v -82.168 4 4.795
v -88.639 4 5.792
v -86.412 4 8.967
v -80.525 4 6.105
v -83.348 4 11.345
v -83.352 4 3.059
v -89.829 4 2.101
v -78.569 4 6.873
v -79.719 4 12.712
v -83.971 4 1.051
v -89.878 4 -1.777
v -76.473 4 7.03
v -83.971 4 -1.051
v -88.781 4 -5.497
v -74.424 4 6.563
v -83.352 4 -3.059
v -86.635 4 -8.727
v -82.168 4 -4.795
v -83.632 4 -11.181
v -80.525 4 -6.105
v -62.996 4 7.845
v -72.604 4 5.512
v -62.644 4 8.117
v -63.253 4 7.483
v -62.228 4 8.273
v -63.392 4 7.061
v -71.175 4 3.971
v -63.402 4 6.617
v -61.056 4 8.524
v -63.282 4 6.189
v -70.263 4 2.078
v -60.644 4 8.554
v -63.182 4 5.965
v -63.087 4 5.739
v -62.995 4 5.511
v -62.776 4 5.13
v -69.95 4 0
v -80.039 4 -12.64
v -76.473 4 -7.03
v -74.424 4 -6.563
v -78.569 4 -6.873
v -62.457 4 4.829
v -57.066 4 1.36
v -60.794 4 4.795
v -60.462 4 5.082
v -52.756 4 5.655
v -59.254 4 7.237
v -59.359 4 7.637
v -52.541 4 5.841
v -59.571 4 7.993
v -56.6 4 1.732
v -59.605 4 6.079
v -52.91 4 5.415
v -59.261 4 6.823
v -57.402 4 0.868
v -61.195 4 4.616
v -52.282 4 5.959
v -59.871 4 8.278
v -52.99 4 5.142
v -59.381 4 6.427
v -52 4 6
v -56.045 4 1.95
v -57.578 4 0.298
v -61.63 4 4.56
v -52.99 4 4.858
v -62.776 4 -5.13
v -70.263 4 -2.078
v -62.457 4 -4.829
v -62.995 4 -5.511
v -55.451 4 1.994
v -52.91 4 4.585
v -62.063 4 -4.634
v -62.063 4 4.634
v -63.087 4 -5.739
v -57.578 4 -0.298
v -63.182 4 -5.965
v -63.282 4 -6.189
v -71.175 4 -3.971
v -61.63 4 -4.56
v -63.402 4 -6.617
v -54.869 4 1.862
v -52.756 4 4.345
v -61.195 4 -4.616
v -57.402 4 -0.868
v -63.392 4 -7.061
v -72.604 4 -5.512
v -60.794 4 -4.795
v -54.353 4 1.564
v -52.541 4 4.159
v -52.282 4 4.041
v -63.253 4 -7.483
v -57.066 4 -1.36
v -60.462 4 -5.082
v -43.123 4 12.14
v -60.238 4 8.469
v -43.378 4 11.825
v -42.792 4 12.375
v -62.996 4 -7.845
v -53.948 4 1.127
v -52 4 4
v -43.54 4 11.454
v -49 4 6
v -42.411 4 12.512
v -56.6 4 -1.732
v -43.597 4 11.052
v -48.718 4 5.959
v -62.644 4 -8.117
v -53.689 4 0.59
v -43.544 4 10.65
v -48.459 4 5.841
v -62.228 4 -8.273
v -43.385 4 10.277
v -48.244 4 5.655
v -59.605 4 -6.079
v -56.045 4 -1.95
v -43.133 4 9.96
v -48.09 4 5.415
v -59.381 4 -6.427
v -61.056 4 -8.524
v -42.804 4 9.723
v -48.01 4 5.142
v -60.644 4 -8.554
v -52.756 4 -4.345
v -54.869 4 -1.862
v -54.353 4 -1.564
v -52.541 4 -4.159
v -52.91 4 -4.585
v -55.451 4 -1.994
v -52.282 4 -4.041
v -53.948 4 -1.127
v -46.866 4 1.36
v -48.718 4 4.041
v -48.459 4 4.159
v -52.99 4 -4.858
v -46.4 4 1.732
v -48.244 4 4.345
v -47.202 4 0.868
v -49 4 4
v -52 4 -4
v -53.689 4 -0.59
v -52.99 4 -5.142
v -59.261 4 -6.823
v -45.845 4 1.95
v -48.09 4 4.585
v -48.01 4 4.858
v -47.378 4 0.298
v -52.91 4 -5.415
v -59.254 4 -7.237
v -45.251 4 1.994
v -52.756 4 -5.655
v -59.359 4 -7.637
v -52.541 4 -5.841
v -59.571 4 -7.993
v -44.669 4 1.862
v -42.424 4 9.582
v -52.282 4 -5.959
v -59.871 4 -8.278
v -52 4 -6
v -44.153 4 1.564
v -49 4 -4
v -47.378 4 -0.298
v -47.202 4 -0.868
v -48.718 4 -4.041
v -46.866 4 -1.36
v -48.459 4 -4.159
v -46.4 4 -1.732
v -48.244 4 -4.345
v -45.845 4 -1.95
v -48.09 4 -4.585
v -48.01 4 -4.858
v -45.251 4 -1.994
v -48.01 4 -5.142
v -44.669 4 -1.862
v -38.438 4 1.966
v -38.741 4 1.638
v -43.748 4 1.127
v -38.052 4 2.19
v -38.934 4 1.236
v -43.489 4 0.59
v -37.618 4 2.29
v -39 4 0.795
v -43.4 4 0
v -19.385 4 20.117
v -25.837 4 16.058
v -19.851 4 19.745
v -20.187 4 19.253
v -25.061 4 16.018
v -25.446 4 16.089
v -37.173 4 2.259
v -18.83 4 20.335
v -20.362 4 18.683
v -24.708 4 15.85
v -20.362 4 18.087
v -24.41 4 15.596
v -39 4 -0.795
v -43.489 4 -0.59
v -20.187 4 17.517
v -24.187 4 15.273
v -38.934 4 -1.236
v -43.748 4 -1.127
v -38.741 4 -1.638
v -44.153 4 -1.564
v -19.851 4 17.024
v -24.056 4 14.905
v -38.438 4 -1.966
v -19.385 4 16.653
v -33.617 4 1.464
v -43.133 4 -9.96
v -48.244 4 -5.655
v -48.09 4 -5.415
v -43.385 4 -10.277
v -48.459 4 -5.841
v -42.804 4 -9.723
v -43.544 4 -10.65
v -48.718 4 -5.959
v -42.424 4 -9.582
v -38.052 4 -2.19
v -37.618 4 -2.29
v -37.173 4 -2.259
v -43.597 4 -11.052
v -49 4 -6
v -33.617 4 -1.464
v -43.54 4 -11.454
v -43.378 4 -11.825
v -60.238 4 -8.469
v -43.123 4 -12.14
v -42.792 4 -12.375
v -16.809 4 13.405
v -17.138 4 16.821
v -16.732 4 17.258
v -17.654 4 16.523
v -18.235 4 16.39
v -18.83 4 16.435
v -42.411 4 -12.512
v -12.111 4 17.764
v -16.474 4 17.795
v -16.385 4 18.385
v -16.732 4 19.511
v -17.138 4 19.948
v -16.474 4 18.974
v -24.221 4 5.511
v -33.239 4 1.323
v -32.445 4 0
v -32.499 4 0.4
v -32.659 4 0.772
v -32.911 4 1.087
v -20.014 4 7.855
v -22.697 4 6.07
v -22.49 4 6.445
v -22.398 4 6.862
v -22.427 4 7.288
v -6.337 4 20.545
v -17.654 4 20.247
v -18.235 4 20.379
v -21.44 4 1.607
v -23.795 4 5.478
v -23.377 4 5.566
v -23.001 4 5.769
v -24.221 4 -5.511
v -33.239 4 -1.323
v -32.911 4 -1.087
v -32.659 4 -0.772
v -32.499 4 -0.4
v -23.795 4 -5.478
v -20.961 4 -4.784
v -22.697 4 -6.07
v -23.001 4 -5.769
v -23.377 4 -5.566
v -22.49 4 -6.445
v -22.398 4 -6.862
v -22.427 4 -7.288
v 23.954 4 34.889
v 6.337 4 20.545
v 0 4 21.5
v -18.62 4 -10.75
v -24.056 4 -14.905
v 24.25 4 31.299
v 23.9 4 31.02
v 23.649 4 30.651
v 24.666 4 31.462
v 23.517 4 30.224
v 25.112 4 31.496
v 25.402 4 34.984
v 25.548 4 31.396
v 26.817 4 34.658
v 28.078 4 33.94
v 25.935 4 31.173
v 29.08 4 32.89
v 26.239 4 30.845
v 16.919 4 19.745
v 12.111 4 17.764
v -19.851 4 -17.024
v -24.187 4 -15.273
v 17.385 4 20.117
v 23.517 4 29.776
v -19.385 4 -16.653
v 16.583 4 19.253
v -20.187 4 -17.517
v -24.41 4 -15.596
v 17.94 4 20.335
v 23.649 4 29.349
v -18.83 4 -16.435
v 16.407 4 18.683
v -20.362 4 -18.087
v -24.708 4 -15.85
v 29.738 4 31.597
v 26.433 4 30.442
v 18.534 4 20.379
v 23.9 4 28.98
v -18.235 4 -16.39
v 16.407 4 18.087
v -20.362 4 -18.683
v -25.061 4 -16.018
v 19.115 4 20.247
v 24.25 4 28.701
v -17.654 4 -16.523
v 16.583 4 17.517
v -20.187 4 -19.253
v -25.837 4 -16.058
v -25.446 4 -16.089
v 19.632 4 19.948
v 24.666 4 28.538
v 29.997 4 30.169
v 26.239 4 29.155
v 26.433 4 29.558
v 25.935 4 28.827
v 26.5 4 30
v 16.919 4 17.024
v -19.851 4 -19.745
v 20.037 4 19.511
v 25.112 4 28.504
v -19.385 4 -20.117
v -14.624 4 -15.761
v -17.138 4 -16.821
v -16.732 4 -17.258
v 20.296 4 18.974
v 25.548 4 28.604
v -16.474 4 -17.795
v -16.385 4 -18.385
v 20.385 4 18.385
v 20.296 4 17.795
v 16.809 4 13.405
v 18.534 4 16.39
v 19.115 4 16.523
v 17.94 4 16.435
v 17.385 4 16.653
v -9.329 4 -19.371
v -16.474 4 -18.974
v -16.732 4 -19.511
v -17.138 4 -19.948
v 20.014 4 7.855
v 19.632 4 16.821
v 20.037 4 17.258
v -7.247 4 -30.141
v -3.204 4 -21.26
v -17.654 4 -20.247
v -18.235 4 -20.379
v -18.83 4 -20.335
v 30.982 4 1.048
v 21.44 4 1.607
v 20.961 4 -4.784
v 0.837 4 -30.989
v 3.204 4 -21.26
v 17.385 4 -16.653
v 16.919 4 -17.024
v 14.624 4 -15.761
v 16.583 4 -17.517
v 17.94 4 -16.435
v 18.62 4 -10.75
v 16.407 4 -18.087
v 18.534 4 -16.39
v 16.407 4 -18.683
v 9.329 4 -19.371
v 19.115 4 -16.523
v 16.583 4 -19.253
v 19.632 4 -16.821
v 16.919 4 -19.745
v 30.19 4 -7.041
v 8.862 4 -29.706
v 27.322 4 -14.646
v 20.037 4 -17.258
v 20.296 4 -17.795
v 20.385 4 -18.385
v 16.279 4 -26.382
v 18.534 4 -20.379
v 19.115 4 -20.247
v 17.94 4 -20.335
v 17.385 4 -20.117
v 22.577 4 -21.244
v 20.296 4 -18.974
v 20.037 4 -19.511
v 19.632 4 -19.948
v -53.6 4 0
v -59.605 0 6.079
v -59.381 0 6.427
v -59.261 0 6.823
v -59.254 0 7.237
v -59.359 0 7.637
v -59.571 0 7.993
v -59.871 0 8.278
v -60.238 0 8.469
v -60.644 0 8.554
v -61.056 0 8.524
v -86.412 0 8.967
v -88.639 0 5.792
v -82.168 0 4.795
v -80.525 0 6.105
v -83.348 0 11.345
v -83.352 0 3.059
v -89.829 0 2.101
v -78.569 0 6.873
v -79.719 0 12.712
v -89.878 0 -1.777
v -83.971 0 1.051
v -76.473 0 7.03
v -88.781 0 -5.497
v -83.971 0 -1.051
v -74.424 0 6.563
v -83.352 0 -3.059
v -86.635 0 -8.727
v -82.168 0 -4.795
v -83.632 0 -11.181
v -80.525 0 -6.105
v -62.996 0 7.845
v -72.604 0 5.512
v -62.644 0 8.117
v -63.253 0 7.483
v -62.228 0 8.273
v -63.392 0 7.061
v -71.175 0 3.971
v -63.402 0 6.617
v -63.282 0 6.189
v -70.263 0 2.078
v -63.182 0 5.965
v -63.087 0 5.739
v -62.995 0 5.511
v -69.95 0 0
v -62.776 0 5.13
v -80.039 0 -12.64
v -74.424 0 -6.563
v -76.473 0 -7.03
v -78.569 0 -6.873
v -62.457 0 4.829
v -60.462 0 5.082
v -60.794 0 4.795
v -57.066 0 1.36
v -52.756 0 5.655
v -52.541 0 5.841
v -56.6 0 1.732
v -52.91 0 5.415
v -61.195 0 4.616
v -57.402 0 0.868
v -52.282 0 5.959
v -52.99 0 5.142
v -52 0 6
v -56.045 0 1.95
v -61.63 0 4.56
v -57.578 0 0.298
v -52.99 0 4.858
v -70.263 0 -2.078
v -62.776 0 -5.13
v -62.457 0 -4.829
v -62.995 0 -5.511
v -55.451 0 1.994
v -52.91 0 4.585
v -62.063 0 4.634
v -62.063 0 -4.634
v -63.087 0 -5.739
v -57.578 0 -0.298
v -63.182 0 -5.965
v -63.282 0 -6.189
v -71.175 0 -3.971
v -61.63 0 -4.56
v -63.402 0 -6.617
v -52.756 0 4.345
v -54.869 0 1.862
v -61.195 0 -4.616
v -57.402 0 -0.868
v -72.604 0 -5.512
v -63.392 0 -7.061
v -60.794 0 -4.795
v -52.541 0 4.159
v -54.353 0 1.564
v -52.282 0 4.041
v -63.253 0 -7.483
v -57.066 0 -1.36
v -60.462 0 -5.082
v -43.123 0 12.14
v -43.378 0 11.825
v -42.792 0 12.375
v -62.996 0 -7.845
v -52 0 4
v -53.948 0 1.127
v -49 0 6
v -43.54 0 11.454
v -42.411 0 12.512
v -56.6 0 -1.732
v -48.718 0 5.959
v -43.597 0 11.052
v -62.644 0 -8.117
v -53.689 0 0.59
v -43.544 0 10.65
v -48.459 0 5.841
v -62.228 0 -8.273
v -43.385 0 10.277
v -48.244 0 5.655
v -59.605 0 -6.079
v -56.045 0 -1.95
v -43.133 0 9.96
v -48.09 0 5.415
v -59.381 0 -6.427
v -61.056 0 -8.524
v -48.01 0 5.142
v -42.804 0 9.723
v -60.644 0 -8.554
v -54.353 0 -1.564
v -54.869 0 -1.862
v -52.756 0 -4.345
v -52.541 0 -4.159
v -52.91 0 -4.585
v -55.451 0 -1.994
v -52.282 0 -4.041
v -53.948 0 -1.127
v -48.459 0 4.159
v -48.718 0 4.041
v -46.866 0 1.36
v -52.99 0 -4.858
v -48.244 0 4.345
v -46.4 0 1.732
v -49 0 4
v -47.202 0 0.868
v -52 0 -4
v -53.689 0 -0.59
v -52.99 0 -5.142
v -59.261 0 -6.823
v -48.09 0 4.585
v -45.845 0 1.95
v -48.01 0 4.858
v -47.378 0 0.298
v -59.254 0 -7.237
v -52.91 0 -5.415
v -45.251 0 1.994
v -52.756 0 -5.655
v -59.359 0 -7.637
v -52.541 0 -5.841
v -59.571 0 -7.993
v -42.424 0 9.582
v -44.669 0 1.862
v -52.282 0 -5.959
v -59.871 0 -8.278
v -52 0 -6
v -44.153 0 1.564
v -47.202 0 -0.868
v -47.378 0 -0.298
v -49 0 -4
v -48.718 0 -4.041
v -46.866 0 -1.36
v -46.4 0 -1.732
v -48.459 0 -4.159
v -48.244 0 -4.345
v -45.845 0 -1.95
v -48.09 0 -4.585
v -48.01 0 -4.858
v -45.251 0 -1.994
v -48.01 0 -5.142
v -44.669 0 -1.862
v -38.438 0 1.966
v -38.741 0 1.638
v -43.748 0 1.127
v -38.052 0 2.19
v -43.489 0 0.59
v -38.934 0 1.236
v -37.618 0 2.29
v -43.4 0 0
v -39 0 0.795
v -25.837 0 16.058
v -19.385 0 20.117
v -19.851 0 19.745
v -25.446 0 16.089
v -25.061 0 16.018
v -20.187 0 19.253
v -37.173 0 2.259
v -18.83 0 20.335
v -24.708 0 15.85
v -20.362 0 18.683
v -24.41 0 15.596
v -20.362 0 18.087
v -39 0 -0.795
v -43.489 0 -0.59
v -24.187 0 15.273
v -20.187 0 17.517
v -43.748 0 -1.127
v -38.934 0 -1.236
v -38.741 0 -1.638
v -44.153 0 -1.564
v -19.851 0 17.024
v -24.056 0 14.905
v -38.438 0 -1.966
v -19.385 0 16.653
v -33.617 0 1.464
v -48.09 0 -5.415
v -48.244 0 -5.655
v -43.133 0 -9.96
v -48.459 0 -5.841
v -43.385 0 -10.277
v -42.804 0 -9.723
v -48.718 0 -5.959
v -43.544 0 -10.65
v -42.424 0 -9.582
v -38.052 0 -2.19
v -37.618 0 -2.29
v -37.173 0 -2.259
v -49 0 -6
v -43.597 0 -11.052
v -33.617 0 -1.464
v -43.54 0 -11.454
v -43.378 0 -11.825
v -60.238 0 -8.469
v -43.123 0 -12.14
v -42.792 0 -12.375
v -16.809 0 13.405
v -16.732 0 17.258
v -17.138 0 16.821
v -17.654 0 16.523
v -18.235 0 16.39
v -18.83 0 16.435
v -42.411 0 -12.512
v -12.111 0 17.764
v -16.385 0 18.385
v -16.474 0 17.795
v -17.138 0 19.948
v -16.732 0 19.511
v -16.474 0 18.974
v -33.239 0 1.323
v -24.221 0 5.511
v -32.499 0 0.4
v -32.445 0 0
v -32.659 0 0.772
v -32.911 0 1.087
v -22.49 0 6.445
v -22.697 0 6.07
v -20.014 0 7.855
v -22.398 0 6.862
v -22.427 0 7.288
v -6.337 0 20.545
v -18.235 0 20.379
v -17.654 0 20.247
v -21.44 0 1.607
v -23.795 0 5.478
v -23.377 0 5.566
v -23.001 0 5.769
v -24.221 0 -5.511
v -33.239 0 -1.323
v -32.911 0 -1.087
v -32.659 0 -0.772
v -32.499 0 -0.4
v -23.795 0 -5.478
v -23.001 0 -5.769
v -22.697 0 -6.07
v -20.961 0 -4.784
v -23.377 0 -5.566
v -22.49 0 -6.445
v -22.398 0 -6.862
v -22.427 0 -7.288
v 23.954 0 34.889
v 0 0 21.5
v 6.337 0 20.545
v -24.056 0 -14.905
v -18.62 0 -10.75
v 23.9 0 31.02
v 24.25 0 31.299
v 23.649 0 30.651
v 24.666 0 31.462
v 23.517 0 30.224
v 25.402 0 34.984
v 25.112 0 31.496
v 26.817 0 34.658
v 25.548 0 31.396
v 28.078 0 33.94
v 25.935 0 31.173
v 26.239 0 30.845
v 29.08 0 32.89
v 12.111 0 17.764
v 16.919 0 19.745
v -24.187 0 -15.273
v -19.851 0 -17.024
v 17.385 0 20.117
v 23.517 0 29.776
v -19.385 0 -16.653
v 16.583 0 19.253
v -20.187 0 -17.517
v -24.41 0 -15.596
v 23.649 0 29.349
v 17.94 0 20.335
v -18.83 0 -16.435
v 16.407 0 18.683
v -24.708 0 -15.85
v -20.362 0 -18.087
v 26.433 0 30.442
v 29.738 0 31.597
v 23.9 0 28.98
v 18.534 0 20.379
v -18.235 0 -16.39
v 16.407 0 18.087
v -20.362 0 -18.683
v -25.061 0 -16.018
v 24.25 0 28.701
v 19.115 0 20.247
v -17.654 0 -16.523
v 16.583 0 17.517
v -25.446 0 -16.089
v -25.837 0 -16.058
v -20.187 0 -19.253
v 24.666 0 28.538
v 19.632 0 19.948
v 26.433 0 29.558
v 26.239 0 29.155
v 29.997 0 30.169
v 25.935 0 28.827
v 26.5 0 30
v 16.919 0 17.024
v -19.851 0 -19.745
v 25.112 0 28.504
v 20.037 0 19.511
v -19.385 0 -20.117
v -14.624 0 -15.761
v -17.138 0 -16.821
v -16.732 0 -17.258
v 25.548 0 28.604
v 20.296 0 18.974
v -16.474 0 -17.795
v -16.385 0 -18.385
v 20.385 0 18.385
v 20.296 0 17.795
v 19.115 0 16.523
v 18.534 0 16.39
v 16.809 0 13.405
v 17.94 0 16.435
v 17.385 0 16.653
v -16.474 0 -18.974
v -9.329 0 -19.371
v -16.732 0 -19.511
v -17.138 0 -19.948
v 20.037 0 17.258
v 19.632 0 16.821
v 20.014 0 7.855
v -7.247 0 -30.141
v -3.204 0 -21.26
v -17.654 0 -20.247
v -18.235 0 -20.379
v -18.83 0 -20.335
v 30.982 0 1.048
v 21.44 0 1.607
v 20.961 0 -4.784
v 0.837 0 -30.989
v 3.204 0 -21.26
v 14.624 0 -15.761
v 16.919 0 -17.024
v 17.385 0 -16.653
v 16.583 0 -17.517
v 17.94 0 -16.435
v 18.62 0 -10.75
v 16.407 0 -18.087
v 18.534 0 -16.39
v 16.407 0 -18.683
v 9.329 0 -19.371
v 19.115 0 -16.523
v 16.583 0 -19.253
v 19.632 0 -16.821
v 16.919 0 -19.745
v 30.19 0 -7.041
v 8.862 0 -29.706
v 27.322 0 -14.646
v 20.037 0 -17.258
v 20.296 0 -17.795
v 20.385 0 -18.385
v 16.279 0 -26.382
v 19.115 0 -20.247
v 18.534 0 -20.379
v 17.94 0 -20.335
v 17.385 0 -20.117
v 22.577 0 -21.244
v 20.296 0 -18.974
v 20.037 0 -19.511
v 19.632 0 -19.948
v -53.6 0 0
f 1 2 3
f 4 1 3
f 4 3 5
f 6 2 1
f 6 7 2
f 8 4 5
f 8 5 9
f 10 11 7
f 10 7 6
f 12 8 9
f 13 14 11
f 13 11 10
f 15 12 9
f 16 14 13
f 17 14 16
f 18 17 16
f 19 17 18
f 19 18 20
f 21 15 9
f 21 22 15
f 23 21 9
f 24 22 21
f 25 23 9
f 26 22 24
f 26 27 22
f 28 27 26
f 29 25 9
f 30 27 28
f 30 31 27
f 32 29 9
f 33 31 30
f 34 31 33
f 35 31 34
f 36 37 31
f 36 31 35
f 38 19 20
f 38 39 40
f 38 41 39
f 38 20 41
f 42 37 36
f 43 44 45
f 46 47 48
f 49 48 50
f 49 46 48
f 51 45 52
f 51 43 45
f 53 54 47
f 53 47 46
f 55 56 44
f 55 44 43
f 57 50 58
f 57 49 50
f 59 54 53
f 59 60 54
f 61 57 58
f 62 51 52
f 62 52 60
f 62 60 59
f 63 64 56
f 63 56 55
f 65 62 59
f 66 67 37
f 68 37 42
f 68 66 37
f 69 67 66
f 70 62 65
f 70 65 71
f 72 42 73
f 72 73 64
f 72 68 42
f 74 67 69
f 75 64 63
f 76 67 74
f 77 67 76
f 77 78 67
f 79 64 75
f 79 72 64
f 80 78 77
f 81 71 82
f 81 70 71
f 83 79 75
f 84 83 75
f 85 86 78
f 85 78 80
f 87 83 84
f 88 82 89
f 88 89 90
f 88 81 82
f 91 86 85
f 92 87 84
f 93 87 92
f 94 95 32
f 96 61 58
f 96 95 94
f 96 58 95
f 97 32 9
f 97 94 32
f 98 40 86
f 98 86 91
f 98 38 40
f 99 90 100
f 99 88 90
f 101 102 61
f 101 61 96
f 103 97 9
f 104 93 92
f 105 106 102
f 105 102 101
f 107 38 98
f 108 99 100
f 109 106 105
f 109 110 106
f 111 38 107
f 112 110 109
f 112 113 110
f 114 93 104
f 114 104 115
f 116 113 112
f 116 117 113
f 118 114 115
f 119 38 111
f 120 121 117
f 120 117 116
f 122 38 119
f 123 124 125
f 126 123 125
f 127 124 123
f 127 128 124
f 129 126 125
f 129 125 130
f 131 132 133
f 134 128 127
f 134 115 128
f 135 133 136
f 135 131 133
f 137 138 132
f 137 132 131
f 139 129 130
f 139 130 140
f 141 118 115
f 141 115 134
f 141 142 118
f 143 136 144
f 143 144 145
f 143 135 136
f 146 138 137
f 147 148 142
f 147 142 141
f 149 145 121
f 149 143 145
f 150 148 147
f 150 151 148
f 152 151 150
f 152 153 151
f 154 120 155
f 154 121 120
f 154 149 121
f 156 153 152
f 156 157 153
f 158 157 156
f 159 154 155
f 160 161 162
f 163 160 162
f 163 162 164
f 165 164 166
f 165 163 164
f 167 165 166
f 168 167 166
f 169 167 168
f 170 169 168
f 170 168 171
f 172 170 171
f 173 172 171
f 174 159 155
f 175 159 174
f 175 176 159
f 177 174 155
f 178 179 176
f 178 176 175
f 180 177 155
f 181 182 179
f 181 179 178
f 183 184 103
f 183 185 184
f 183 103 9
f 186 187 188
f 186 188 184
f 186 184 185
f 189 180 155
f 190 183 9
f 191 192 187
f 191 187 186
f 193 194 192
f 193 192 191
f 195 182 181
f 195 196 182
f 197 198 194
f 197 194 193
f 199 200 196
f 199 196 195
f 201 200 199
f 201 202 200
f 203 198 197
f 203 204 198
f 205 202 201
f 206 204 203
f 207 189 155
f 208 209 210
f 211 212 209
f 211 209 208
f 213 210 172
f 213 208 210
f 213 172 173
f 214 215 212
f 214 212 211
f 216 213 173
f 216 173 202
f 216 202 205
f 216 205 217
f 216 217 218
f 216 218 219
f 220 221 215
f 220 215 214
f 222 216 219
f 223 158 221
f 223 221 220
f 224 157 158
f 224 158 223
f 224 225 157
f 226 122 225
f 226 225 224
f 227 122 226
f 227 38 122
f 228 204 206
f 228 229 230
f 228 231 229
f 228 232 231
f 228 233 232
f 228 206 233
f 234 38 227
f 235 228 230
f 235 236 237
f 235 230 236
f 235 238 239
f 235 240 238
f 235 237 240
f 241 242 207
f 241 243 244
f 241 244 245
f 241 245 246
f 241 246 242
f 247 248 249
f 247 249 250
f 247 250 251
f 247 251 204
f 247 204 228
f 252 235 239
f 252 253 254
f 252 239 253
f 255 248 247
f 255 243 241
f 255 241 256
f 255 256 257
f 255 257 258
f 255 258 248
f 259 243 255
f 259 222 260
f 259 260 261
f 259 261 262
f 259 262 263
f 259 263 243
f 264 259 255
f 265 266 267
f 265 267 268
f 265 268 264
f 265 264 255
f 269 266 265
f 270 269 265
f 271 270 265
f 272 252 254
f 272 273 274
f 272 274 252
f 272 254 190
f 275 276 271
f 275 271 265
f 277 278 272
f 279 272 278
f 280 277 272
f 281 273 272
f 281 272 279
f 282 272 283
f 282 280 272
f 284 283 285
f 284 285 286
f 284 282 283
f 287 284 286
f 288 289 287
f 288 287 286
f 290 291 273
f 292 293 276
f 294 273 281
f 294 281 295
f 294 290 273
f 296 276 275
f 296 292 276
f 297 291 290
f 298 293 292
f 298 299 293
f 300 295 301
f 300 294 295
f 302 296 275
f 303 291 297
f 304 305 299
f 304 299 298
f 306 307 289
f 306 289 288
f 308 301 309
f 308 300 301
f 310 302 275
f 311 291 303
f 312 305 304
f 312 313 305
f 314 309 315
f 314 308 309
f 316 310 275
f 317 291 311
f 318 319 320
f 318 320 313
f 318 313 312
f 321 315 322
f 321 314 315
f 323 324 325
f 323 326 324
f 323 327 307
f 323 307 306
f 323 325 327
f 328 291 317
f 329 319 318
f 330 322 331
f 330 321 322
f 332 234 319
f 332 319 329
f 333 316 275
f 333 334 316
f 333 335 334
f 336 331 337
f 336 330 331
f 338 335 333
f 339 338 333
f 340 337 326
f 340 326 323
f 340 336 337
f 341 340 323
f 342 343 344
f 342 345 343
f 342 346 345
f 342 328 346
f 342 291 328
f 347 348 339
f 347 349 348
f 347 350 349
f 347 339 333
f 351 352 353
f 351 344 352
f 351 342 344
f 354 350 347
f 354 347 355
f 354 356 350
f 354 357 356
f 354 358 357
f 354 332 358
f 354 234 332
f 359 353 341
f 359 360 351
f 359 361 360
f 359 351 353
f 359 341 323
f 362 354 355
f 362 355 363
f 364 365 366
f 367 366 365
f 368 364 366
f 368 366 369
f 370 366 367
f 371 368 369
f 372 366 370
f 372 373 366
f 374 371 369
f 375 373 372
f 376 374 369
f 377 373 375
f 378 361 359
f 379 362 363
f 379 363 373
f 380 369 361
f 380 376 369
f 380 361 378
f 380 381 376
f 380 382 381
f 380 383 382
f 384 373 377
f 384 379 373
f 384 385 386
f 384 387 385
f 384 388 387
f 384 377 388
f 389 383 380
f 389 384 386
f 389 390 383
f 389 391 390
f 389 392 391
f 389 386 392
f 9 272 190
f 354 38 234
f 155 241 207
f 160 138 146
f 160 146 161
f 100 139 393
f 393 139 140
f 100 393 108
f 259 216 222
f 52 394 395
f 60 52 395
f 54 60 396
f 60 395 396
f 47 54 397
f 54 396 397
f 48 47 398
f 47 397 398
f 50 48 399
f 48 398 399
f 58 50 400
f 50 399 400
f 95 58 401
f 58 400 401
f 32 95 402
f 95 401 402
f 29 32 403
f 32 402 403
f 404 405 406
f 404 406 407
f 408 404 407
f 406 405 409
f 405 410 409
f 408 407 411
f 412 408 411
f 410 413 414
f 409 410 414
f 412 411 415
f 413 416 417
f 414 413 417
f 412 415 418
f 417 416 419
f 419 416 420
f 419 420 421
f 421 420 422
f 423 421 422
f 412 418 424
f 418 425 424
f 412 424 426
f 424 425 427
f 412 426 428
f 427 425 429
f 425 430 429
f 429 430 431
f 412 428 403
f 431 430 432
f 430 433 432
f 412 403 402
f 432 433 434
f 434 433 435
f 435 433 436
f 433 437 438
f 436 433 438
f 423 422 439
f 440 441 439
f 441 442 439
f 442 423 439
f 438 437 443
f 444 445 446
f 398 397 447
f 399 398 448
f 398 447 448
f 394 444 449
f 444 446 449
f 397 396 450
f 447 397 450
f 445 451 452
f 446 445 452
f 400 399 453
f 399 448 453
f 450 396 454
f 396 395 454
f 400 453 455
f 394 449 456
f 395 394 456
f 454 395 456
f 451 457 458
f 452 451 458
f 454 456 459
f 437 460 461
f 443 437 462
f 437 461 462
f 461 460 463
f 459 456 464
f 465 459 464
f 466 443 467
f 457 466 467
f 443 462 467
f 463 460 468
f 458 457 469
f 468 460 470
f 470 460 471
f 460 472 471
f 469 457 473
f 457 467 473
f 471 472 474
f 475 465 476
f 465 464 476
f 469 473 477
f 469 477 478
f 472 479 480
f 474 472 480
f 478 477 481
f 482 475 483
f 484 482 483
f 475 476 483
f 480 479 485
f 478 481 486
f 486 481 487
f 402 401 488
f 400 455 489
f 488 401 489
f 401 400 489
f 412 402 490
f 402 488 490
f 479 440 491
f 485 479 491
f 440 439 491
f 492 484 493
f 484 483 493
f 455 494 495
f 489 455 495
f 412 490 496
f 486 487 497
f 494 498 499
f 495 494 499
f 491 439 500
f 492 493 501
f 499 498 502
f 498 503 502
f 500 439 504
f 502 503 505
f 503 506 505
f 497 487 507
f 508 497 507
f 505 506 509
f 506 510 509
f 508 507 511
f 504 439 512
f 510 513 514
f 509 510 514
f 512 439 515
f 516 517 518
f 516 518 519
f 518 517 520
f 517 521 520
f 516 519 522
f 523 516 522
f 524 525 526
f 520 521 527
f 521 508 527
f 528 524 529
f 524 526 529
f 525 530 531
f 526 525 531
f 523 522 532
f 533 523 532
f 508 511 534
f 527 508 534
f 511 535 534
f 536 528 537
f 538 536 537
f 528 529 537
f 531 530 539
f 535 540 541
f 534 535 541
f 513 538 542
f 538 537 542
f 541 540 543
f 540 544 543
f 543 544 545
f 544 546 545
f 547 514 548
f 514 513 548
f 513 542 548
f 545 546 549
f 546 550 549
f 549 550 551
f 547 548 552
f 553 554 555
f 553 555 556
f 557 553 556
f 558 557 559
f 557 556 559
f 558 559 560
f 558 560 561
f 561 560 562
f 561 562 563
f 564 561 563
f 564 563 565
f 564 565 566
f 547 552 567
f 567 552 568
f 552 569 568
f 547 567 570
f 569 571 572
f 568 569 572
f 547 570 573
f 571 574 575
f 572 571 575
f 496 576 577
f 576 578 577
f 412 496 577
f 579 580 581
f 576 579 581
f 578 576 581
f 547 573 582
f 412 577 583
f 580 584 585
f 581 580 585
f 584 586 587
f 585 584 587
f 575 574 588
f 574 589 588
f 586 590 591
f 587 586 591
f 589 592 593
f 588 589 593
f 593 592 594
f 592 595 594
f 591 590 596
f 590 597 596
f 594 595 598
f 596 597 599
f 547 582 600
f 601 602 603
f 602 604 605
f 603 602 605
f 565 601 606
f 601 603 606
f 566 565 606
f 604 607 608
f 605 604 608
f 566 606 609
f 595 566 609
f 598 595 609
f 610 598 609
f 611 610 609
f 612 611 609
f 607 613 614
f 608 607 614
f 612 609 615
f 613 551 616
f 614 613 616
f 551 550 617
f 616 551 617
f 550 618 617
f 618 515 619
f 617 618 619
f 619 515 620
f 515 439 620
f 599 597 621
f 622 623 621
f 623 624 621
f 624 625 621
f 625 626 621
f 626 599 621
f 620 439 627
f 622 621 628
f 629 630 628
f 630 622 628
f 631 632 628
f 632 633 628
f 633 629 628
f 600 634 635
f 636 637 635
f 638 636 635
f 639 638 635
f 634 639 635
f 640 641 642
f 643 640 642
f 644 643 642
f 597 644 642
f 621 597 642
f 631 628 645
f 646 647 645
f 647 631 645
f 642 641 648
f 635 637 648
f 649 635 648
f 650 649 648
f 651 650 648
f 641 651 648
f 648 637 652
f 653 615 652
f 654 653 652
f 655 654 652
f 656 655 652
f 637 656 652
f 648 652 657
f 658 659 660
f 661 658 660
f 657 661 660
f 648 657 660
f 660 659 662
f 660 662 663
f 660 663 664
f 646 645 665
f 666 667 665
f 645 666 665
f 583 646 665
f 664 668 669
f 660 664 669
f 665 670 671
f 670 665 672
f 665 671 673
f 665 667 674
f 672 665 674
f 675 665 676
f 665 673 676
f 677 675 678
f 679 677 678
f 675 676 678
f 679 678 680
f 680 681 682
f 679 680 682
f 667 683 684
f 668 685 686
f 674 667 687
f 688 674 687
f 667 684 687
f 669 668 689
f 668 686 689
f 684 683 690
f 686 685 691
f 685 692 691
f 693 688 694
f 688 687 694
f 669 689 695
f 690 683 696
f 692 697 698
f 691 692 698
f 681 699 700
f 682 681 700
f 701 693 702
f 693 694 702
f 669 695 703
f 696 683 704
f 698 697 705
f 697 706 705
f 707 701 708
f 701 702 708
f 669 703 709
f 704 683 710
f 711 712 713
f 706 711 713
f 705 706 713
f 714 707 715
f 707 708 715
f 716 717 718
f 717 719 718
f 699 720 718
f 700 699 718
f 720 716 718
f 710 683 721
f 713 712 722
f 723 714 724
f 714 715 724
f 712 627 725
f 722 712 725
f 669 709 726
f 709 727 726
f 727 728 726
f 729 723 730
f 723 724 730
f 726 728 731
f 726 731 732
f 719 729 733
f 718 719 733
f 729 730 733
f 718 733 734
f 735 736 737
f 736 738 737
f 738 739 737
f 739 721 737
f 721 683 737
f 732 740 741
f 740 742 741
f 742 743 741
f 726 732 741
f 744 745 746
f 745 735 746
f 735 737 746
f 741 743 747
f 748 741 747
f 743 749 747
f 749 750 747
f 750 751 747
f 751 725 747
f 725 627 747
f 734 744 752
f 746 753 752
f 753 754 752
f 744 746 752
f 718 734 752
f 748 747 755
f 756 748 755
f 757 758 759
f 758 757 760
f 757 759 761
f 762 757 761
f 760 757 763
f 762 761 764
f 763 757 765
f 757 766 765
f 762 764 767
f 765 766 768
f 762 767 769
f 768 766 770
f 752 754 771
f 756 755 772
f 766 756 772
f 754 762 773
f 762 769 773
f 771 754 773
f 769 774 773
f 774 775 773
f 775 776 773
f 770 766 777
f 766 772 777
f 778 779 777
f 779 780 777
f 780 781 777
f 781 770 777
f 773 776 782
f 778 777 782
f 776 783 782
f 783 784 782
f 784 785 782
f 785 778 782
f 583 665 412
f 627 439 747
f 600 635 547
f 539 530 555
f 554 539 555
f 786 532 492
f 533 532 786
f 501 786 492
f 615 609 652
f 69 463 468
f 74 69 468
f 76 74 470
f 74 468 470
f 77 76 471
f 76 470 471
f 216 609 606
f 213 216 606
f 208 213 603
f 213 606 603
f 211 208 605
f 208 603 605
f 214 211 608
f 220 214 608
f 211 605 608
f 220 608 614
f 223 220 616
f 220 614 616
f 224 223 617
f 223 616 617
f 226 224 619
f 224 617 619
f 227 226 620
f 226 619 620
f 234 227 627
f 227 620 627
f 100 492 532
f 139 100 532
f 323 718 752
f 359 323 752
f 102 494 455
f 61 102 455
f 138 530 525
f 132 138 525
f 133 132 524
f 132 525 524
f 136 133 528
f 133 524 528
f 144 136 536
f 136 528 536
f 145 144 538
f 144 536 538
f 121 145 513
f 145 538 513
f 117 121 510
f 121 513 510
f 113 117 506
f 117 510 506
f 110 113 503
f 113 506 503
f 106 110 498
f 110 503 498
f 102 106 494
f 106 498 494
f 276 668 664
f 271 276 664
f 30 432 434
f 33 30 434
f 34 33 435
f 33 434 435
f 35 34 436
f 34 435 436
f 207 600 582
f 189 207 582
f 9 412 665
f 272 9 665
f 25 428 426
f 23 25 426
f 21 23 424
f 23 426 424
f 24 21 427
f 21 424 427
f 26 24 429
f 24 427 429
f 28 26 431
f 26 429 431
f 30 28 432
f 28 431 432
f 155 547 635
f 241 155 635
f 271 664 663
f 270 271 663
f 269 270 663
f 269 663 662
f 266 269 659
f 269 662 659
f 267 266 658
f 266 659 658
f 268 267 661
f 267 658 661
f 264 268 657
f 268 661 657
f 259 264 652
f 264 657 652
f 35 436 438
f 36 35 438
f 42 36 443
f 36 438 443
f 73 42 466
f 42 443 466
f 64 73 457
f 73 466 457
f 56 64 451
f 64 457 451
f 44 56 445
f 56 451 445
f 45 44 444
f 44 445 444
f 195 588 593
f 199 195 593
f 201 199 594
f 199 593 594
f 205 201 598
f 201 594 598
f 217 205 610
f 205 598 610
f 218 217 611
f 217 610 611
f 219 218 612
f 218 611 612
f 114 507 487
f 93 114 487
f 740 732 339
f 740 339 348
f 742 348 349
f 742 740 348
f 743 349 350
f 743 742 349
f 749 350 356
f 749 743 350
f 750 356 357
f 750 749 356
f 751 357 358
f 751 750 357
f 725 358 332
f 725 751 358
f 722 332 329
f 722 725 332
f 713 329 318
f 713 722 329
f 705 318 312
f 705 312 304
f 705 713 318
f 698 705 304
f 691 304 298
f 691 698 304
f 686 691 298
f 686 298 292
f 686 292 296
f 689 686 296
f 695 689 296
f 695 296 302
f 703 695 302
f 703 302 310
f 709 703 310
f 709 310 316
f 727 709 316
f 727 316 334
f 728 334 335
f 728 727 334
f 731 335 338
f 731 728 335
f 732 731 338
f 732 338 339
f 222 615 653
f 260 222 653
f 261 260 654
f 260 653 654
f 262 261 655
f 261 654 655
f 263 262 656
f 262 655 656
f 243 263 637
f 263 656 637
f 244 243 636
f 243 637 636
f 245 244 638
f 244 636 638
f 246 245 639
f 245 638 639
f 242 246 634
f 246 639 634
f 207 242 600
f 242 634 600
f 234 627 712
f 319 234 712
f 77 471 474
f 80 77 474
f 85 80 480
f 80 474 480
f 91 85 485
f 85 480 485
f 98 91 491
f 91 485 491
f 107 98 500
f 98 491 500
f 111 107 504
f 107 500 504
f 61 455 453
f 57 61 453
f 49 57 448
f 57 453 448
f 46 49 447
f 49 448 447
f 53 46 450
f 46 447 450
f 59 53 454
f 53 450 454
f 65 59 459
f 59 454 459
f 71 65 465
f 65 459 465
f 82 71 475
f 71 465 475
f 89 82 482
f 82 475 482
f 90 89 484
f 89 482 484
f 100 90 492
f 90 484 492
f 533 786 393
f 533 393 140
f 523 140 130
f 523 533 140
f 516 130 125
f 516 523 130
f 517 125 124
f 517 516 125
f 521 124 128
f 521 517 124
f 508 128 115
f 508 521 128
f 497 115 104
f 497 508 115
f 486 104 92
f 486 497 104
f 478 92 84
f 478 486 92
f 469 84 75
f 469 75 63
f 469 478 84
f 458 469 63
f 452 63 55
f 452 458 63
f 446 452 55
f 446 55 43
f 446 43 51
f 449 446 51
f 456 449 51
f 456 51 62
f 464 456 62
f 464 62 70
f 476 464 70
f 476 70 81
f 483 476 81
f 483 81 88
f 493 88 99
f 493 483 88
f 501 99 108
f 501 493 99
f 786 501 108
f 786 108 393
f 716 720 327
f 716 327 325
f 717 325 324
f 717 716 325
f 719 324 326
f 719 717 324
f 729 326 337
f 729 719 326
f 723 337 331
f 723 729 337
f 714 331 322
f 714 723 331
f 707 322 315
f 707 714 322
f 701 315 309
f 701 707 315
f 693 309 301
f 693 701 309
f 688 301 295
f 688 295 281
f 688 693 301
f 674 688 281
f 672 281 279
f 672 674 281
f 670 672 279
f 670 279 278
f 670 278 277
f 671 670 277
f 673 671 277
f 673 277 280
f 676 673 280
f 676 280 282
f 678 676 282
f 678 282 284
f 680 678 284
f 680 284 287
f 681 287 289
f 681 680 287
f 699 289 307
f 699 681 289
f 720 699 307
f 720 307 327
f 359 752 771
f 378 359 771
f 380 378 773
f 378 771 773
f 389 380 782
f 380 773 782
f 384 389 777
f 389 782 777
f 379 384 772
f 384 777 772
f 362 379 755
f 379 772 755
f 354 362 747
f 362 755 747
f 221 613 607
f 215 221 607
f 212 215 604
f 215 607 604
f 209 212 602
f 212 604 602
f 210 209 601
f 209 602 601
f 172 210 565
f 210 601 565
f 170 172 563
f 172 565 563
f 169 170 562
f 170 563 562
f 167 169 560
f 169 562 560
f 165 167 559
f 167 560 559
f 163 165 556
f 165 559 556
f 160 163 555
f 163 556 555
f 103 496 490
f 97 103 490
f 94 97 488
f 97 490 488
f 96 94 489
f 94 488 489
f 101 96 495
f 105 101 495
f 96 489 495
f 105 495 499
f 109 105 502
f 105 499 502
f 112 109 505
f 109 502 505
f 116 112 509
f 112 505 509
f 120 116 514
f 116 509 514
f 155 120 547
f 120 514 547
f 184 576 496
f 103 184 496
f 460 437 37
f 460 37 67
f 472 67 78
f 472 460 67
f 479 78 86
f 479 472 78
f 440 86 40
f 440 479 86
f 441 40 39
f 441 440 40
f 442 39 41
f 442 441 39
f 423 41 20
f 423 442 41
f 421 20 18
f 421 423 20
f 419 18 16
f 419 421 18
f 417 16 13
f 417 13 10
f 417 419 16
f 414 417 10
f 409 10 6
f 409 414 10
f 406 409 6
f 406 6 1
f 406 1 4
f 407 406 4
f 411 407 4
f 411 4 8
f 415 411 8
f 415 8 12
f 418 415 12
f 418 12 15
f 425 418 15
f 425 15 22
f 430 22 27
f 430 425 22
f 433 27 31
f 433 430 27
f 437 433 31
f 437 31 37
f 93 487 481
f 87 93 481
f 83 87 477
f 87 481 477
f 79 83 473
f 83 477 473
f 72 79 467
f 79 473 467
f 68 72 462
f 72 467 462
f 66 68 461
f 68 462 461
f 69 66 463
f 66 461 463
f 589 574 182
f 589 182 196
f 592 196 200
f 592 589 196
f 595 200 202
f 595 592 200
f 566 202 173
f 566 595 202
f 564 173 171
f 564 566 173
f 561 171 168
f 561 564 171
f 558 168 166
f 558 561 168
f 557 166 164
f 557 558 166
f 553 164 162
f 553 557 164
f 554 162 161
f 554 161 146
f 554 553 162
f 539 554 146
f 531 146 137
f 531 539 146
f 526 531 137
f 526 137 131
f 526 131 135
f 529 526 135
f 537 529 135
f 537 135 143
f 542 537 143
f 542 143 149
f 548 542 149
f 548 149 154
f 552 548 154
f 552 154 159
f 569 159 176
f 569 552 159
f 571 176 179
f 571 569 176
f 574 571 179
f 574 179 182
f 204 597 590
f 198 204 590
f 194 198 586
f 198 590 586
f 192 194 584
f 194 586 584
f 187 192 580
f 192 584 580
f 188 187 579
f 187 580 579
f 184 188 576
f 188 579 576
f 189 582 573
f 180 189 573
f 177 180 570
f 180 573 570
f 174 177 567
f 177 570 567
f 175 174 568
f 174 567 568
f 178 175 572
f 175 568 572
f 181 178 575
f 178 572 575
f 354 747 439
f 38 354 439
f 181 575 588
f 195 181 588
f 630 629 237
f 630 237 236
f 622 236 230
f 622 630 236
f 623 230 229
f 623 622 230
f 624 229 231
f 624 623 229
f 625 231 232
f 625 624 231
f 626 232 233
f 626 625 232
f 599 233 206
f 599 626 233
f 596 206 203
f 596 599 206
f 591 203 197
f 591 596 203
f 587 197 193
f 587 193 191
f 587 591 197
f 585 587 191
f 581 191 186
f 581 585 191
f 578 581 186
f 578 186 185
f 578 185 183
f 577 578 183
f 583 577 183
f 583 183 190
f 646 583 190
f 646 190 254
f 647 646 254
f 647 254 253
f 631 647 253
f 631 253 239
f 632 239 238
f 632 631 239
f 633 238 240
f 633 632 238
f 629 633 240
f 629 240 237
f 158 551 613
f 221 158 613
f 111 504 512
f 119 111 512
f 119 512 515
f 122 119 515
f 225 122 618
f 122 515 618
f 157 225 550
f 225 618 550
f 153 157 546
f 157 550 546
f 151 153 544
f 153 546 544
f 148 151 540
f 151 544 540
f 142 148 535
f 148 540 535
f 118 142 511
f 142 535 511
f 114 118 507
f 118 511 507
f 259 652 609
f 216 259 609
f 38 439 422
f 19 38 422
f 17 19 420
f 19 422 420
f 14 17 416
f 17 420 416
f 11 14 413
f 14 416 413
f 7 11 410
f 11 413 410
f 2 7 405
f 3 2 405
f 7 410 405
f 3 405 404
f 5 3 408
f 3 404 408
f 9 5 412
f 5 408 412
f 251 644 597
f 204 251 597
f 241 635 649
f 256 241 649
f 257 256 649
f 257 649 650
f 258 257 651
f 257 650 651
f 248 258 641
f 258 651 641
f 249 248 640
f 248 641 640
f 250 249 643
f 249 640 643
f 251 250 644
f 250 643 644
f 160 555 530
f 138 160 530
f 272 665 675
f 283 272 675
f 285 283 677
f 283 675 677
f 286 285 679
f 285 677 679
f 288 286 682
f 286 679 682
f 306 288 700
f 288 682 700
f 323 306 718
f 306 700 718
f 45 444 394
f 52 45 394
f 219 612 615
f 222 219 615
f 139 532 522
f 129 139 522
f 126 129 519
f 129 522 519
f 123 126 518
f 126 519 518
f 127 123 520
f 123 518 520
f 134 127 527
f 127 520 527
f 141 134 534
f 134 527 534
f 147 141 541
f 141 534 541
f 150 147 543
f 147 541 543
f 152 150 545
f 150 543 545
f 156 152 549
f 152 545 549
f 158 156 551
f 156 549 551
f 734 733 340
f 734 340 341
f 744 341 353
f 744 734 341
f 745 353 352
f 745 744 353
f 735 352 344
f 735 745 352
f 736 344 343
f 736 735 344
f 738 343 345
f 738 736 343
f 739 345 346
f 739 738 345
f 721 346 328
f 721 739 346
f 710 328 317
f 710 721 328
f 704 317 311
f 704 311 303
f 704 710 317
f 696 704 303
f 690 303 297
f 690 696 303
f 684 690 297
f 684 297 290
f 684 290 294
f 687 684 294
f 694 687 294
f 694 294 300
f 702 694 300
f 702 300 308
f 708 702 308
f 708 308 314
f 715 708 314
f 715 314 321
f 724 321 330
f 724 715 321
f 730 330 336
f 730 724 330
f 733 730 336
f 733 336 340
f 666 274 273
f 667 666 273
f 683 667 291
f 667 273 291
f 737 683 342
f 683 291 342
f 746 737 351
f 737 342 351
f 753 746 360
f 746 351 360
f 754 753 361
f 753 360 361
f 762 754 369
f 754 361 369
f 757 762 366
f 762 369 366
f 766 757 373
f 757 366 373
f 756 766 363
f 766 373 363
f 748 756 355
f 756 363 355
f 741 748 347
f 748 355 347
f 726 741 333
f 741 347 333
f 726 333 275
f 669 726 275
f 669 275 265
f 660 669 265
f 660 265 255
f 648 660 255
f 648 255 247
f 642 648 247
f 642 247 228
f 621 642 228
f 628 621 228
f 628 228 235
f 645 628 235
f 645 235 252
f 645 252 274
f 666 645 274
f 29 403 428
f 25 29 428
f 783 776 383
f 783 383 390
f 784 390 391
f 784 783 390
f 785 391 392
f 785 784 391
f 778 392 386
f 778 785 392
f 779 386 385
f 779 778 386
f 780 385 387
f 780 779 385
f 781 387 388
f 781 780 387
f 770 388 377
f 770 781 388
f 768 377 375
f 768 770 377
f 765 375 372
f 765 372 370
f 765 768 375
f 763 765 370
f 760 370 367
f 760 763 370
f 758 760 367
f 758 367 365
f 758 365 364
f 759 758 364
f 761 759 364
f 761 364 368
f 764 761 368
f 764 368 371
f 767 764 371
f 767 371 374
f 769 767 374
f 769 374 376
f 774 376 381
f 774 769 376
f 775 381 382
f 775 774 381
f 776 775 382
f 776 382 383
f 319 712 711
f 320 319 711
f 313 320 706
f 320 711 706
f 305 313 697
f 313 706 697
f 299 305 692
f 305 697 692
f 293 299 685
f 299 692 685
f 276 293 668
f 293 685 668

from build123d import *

# Parameters (mm, degrees)
OTHER_194_OUTLINE_R   = 1.5
OTHER_194_OUTLINE_R_2 = 2
OTHER_194_OUTLINE_R_3 = 7.05
OTHER_194_OUTLINE_R_4 = 13
OTHER_194_DEPTH       = 4
SKETCH_2_R            = 21.5
CUT_EXTRUDE_1_DEPTH   = 97.648848933


# Read off the part's stored shape, not the designer's step: the other step
with BuildPart() as part:
    # Other 194 outline → Other 194 (new body)
    with BuildSketch(Plane(origin=(0, 0, 0), x_dir=(1, 0, 0), z_dir=(0, 1, 0))):
        with BuildLine():
            ThreePointArc((-80.038961039, 12.639806795), (-89.998966964, -0.163883698), (-79.719334557, -12.712404162))
            Line((-79.719334557, -12.712404162), (23.954102093, -34.889386216))
            ThreePointArc((23.954102093, -34.889386216), (28.077901504, -33.940370837), (29.997141433, -30.169048806))
            Line((29.997141433, -30.169048806), (30.982276884, -1.048102596))
            ThreePointArc((30.982276884, -1.048102596), (19.596811299, 24.020095481), (-7.246753247, 30.141077741))
            Line((-7.246753247, 30.141077741), (-80.038961039, 12.639806795))
        make_face()
        with BuildLine():
            ThreePointArc((-62.228072273, -8.273007388), (-63.252931738, -7.483002306), (-63.281586626, -6.189316158))
            ThreePointArc((-63.281586626, -6.189316158), (-63.134274256, -5.851850099), (-62.995261901, -5.510881125))
            ThreePointArc((-62.995261901, -5.510881125), (-61.849651838, -4.581154117), (-60.461969326, -5.082304763))
            Line((-60.461969326, -5.082304763), (-59.605161669, -6.078992007))
            ThreePointArc((-59.605161669, -6.078992007), (-59.452788579, -7.822528522), (-61.056402543, -8.523641489))
            Line((-61.056402543, -8.523641489), (-62.228072273, -8.273007388))
        make_face(mode=Mode.SUBTRACT)
        with BuildLine():
            Line((-25.836688979, -16.057557417), (-42.41065304, -12.512189235))
            ThreePointArc((-42.41065304, -12.512189235), (-43.596867532, -11.052331075), (-42.424246953, -9.581531412))
            Line((-42.424246953, -9.581531412), (-24.221088321, -5.510705486))
            ThreePointArc((-24.221088321, -5.510705486), (-22.837996114, -5.908978844), (-22.426909172, -7.288316817))
            Line((-22.426909172, -7.288316817), (-24.056103742, -14.904510924))
            ThreePointArc((-24.056103742, -14.904510924), (-24.707592613, -15.849805447), (-25.836688979, -16.057557417))
        make_face(mode=Mode.SUBTRACT)
        with Locations((25, -30)):
            Circle(OTHER_194_OUTLINE_R, mode=Mode.SUBTRACT)
        with Locations((-18.384776311, -18.384776311)):
            Circle(OTHER_194_OUTLINE_R_2, mode=Mode.SUBTRACT)
        with Locations((-12.374368671, -12.374368671)):
            Circle(OTHER_194_OUTLINE_R_2, mode=Mode.SUBTRACT)
        with Locations((12.374368671, -12.374368671)):
            Circle(OTHER_194_OUTLINE_R_2, mode=Mode.SUBTRACT)
        with Locations((18.384776311, -18.384776311)):
            Circle(OTHER_194_OUTLINE_R_2, mode=Mode.SUBTRACT)
        with Locations((-77, 0)):
            Circle(OTHER_194_OUTLINE_R_3, mode=Mode.SUBTRACT)
        with BuildLine():
            ThreePointArc((-60.461969326, 5.082304763), (-61.849651838, 4.581154117), (-62.995261901, 5.510881125))
            ThreePointArc((-62.995261901, 5.510881125), (-63.134274256, 5.851850099), (-63.281586626, 6.189316158))
            ThreePointArc((-63.281586626, 6.189316158), (-63.252931738, 7.483002306), (-62.228072273, 8.273007388))
            Line((-62.228072273, 8.273007388), (-61.056402543, 8.523641489))
            ThreePointArc((-61.056402543, 8.523641489), (-59.452788579, 7.822528522), (-59.605161669, 6.078992007))
            Line((-59.605161669, 6.078992007), (-60.461969326, 5.082304763))
        make_face(mode=Mode.SUBTRACT)
        with Locations((-55.6, 0)):
            Circle(OTHER_194_OUTLINE_R_2, mode=Mode.SUBTRACT)
        with BuildLine():
            Line((-49, 4), (-49, -4))
            ThreePointArc((-49, -4), (-48, -5), (-49, -6))
            Line((-49, -6), (-52, -6))
            ThreePointArc((-52, -6), (-53, -5), (-52, -4))
            Line((-52, -4), (-52, 4))
            ThreePointArc((-52, 4), (-53, 5), (-52, 6))
            Line((-52, 6), (-49, 6))
            ThreePointArc((-49, 6), (-48, 5), (-49, 4))
        make_face(mode=Mode.SUBTRACT)
        with Locations((-45.4, 0)):
            Circle(OTHER_194_OUTLINE_R_2, mode=Mode.SUBTRACT)
        with BuildLine():
            Line((-39, -0.79505171), (-39, 0.79505171))
            ThreePointArc((-39, 0.79505171), (-38.437804637, 1.965744865), (-37.172636716, 2.258893669))
            Line((-37.172636716, 2.258893669), (-33.617473054, 1.463841959))
            ThreePointArc((-33.617473054, 1.463841959), (-32.444836338, 0), (-33.617473054, -1.463841959))
            Line((-33.617473054, -1.463841959), (-37.172636716, -2.258893669))
            ThreePointArc((-37.172636716, -2.258893669), (-38.437804637, -1.965744865), (-39, -0.79505171))
        make_face(mode=Mode.SUBTRACT)
        with BuildLine():
            Line((-24.221088321, 5.510705486), (-42.424246953, 9.581531412))
            ThreePointArc((-42.424246953, 9.581531412), (-43.596867532, 11.052331075), (-42.41065304, 12.512189235))
            Line((-42.41065304, 12.512189235), (-25.836688979, 16.057557417))
            ThreePointArc((-25.836688979, 16.057557417), (-24.707592613, 15.849805447), (-24.056103742, 14.904510924))
            Line((-24.056103742, 14.904510924), (-22.426909172, 7.288316817))
            ThreePointArc((-22.426909172, 7.288316817), (-22.837996114, 5.908978844), (-24.221088321, 5.510705486))
        make_face(mode=Mode.SUBTRACT)
        Circle(OTHER_194_OUTLINE_R_4, mode=Mode.SUBTRACT)
        with Locations((-12.374368671, 12.374368671)):
            Circle(OTHER_194_OUTLINE_R_2, mode=Mode.SUBTRACT)
        with Locations((12.374368671, 12.374368671)):
            Circle(OTHER_194_OUTLINE_R_2, mode=Mode.SUBTRACT)
        with Locations((-18.384776311, 18.384776311)):
            Circle(OTHER_194_OUTLINE_R_2, mode=Mode.SUBTRACT)
        with Locations((18.384776311, 18.384776311)):
            Circle(OTHER_194_OUTLINE_R_2, mode=Mode.SUBTRACT)
    extrude(amount=OTHER_194_DEPTH)

    # Sketch 2 → Cut-Extrude 1 (cut, through all)
    with BuildSketch(Plane(origin=(0, 4, 0), x_dir=(1, 0, 0), z_dir=(0, 1, 0))):
        with Locations(Location((0, 0, 0), (0, 0, 270))):
            Circle(SKETCH_2_R)
    extrude(amount=-CUT_EXTRUDE_1_DEPTH, mode=Mode.SUBTRACT)


solid = part.part
